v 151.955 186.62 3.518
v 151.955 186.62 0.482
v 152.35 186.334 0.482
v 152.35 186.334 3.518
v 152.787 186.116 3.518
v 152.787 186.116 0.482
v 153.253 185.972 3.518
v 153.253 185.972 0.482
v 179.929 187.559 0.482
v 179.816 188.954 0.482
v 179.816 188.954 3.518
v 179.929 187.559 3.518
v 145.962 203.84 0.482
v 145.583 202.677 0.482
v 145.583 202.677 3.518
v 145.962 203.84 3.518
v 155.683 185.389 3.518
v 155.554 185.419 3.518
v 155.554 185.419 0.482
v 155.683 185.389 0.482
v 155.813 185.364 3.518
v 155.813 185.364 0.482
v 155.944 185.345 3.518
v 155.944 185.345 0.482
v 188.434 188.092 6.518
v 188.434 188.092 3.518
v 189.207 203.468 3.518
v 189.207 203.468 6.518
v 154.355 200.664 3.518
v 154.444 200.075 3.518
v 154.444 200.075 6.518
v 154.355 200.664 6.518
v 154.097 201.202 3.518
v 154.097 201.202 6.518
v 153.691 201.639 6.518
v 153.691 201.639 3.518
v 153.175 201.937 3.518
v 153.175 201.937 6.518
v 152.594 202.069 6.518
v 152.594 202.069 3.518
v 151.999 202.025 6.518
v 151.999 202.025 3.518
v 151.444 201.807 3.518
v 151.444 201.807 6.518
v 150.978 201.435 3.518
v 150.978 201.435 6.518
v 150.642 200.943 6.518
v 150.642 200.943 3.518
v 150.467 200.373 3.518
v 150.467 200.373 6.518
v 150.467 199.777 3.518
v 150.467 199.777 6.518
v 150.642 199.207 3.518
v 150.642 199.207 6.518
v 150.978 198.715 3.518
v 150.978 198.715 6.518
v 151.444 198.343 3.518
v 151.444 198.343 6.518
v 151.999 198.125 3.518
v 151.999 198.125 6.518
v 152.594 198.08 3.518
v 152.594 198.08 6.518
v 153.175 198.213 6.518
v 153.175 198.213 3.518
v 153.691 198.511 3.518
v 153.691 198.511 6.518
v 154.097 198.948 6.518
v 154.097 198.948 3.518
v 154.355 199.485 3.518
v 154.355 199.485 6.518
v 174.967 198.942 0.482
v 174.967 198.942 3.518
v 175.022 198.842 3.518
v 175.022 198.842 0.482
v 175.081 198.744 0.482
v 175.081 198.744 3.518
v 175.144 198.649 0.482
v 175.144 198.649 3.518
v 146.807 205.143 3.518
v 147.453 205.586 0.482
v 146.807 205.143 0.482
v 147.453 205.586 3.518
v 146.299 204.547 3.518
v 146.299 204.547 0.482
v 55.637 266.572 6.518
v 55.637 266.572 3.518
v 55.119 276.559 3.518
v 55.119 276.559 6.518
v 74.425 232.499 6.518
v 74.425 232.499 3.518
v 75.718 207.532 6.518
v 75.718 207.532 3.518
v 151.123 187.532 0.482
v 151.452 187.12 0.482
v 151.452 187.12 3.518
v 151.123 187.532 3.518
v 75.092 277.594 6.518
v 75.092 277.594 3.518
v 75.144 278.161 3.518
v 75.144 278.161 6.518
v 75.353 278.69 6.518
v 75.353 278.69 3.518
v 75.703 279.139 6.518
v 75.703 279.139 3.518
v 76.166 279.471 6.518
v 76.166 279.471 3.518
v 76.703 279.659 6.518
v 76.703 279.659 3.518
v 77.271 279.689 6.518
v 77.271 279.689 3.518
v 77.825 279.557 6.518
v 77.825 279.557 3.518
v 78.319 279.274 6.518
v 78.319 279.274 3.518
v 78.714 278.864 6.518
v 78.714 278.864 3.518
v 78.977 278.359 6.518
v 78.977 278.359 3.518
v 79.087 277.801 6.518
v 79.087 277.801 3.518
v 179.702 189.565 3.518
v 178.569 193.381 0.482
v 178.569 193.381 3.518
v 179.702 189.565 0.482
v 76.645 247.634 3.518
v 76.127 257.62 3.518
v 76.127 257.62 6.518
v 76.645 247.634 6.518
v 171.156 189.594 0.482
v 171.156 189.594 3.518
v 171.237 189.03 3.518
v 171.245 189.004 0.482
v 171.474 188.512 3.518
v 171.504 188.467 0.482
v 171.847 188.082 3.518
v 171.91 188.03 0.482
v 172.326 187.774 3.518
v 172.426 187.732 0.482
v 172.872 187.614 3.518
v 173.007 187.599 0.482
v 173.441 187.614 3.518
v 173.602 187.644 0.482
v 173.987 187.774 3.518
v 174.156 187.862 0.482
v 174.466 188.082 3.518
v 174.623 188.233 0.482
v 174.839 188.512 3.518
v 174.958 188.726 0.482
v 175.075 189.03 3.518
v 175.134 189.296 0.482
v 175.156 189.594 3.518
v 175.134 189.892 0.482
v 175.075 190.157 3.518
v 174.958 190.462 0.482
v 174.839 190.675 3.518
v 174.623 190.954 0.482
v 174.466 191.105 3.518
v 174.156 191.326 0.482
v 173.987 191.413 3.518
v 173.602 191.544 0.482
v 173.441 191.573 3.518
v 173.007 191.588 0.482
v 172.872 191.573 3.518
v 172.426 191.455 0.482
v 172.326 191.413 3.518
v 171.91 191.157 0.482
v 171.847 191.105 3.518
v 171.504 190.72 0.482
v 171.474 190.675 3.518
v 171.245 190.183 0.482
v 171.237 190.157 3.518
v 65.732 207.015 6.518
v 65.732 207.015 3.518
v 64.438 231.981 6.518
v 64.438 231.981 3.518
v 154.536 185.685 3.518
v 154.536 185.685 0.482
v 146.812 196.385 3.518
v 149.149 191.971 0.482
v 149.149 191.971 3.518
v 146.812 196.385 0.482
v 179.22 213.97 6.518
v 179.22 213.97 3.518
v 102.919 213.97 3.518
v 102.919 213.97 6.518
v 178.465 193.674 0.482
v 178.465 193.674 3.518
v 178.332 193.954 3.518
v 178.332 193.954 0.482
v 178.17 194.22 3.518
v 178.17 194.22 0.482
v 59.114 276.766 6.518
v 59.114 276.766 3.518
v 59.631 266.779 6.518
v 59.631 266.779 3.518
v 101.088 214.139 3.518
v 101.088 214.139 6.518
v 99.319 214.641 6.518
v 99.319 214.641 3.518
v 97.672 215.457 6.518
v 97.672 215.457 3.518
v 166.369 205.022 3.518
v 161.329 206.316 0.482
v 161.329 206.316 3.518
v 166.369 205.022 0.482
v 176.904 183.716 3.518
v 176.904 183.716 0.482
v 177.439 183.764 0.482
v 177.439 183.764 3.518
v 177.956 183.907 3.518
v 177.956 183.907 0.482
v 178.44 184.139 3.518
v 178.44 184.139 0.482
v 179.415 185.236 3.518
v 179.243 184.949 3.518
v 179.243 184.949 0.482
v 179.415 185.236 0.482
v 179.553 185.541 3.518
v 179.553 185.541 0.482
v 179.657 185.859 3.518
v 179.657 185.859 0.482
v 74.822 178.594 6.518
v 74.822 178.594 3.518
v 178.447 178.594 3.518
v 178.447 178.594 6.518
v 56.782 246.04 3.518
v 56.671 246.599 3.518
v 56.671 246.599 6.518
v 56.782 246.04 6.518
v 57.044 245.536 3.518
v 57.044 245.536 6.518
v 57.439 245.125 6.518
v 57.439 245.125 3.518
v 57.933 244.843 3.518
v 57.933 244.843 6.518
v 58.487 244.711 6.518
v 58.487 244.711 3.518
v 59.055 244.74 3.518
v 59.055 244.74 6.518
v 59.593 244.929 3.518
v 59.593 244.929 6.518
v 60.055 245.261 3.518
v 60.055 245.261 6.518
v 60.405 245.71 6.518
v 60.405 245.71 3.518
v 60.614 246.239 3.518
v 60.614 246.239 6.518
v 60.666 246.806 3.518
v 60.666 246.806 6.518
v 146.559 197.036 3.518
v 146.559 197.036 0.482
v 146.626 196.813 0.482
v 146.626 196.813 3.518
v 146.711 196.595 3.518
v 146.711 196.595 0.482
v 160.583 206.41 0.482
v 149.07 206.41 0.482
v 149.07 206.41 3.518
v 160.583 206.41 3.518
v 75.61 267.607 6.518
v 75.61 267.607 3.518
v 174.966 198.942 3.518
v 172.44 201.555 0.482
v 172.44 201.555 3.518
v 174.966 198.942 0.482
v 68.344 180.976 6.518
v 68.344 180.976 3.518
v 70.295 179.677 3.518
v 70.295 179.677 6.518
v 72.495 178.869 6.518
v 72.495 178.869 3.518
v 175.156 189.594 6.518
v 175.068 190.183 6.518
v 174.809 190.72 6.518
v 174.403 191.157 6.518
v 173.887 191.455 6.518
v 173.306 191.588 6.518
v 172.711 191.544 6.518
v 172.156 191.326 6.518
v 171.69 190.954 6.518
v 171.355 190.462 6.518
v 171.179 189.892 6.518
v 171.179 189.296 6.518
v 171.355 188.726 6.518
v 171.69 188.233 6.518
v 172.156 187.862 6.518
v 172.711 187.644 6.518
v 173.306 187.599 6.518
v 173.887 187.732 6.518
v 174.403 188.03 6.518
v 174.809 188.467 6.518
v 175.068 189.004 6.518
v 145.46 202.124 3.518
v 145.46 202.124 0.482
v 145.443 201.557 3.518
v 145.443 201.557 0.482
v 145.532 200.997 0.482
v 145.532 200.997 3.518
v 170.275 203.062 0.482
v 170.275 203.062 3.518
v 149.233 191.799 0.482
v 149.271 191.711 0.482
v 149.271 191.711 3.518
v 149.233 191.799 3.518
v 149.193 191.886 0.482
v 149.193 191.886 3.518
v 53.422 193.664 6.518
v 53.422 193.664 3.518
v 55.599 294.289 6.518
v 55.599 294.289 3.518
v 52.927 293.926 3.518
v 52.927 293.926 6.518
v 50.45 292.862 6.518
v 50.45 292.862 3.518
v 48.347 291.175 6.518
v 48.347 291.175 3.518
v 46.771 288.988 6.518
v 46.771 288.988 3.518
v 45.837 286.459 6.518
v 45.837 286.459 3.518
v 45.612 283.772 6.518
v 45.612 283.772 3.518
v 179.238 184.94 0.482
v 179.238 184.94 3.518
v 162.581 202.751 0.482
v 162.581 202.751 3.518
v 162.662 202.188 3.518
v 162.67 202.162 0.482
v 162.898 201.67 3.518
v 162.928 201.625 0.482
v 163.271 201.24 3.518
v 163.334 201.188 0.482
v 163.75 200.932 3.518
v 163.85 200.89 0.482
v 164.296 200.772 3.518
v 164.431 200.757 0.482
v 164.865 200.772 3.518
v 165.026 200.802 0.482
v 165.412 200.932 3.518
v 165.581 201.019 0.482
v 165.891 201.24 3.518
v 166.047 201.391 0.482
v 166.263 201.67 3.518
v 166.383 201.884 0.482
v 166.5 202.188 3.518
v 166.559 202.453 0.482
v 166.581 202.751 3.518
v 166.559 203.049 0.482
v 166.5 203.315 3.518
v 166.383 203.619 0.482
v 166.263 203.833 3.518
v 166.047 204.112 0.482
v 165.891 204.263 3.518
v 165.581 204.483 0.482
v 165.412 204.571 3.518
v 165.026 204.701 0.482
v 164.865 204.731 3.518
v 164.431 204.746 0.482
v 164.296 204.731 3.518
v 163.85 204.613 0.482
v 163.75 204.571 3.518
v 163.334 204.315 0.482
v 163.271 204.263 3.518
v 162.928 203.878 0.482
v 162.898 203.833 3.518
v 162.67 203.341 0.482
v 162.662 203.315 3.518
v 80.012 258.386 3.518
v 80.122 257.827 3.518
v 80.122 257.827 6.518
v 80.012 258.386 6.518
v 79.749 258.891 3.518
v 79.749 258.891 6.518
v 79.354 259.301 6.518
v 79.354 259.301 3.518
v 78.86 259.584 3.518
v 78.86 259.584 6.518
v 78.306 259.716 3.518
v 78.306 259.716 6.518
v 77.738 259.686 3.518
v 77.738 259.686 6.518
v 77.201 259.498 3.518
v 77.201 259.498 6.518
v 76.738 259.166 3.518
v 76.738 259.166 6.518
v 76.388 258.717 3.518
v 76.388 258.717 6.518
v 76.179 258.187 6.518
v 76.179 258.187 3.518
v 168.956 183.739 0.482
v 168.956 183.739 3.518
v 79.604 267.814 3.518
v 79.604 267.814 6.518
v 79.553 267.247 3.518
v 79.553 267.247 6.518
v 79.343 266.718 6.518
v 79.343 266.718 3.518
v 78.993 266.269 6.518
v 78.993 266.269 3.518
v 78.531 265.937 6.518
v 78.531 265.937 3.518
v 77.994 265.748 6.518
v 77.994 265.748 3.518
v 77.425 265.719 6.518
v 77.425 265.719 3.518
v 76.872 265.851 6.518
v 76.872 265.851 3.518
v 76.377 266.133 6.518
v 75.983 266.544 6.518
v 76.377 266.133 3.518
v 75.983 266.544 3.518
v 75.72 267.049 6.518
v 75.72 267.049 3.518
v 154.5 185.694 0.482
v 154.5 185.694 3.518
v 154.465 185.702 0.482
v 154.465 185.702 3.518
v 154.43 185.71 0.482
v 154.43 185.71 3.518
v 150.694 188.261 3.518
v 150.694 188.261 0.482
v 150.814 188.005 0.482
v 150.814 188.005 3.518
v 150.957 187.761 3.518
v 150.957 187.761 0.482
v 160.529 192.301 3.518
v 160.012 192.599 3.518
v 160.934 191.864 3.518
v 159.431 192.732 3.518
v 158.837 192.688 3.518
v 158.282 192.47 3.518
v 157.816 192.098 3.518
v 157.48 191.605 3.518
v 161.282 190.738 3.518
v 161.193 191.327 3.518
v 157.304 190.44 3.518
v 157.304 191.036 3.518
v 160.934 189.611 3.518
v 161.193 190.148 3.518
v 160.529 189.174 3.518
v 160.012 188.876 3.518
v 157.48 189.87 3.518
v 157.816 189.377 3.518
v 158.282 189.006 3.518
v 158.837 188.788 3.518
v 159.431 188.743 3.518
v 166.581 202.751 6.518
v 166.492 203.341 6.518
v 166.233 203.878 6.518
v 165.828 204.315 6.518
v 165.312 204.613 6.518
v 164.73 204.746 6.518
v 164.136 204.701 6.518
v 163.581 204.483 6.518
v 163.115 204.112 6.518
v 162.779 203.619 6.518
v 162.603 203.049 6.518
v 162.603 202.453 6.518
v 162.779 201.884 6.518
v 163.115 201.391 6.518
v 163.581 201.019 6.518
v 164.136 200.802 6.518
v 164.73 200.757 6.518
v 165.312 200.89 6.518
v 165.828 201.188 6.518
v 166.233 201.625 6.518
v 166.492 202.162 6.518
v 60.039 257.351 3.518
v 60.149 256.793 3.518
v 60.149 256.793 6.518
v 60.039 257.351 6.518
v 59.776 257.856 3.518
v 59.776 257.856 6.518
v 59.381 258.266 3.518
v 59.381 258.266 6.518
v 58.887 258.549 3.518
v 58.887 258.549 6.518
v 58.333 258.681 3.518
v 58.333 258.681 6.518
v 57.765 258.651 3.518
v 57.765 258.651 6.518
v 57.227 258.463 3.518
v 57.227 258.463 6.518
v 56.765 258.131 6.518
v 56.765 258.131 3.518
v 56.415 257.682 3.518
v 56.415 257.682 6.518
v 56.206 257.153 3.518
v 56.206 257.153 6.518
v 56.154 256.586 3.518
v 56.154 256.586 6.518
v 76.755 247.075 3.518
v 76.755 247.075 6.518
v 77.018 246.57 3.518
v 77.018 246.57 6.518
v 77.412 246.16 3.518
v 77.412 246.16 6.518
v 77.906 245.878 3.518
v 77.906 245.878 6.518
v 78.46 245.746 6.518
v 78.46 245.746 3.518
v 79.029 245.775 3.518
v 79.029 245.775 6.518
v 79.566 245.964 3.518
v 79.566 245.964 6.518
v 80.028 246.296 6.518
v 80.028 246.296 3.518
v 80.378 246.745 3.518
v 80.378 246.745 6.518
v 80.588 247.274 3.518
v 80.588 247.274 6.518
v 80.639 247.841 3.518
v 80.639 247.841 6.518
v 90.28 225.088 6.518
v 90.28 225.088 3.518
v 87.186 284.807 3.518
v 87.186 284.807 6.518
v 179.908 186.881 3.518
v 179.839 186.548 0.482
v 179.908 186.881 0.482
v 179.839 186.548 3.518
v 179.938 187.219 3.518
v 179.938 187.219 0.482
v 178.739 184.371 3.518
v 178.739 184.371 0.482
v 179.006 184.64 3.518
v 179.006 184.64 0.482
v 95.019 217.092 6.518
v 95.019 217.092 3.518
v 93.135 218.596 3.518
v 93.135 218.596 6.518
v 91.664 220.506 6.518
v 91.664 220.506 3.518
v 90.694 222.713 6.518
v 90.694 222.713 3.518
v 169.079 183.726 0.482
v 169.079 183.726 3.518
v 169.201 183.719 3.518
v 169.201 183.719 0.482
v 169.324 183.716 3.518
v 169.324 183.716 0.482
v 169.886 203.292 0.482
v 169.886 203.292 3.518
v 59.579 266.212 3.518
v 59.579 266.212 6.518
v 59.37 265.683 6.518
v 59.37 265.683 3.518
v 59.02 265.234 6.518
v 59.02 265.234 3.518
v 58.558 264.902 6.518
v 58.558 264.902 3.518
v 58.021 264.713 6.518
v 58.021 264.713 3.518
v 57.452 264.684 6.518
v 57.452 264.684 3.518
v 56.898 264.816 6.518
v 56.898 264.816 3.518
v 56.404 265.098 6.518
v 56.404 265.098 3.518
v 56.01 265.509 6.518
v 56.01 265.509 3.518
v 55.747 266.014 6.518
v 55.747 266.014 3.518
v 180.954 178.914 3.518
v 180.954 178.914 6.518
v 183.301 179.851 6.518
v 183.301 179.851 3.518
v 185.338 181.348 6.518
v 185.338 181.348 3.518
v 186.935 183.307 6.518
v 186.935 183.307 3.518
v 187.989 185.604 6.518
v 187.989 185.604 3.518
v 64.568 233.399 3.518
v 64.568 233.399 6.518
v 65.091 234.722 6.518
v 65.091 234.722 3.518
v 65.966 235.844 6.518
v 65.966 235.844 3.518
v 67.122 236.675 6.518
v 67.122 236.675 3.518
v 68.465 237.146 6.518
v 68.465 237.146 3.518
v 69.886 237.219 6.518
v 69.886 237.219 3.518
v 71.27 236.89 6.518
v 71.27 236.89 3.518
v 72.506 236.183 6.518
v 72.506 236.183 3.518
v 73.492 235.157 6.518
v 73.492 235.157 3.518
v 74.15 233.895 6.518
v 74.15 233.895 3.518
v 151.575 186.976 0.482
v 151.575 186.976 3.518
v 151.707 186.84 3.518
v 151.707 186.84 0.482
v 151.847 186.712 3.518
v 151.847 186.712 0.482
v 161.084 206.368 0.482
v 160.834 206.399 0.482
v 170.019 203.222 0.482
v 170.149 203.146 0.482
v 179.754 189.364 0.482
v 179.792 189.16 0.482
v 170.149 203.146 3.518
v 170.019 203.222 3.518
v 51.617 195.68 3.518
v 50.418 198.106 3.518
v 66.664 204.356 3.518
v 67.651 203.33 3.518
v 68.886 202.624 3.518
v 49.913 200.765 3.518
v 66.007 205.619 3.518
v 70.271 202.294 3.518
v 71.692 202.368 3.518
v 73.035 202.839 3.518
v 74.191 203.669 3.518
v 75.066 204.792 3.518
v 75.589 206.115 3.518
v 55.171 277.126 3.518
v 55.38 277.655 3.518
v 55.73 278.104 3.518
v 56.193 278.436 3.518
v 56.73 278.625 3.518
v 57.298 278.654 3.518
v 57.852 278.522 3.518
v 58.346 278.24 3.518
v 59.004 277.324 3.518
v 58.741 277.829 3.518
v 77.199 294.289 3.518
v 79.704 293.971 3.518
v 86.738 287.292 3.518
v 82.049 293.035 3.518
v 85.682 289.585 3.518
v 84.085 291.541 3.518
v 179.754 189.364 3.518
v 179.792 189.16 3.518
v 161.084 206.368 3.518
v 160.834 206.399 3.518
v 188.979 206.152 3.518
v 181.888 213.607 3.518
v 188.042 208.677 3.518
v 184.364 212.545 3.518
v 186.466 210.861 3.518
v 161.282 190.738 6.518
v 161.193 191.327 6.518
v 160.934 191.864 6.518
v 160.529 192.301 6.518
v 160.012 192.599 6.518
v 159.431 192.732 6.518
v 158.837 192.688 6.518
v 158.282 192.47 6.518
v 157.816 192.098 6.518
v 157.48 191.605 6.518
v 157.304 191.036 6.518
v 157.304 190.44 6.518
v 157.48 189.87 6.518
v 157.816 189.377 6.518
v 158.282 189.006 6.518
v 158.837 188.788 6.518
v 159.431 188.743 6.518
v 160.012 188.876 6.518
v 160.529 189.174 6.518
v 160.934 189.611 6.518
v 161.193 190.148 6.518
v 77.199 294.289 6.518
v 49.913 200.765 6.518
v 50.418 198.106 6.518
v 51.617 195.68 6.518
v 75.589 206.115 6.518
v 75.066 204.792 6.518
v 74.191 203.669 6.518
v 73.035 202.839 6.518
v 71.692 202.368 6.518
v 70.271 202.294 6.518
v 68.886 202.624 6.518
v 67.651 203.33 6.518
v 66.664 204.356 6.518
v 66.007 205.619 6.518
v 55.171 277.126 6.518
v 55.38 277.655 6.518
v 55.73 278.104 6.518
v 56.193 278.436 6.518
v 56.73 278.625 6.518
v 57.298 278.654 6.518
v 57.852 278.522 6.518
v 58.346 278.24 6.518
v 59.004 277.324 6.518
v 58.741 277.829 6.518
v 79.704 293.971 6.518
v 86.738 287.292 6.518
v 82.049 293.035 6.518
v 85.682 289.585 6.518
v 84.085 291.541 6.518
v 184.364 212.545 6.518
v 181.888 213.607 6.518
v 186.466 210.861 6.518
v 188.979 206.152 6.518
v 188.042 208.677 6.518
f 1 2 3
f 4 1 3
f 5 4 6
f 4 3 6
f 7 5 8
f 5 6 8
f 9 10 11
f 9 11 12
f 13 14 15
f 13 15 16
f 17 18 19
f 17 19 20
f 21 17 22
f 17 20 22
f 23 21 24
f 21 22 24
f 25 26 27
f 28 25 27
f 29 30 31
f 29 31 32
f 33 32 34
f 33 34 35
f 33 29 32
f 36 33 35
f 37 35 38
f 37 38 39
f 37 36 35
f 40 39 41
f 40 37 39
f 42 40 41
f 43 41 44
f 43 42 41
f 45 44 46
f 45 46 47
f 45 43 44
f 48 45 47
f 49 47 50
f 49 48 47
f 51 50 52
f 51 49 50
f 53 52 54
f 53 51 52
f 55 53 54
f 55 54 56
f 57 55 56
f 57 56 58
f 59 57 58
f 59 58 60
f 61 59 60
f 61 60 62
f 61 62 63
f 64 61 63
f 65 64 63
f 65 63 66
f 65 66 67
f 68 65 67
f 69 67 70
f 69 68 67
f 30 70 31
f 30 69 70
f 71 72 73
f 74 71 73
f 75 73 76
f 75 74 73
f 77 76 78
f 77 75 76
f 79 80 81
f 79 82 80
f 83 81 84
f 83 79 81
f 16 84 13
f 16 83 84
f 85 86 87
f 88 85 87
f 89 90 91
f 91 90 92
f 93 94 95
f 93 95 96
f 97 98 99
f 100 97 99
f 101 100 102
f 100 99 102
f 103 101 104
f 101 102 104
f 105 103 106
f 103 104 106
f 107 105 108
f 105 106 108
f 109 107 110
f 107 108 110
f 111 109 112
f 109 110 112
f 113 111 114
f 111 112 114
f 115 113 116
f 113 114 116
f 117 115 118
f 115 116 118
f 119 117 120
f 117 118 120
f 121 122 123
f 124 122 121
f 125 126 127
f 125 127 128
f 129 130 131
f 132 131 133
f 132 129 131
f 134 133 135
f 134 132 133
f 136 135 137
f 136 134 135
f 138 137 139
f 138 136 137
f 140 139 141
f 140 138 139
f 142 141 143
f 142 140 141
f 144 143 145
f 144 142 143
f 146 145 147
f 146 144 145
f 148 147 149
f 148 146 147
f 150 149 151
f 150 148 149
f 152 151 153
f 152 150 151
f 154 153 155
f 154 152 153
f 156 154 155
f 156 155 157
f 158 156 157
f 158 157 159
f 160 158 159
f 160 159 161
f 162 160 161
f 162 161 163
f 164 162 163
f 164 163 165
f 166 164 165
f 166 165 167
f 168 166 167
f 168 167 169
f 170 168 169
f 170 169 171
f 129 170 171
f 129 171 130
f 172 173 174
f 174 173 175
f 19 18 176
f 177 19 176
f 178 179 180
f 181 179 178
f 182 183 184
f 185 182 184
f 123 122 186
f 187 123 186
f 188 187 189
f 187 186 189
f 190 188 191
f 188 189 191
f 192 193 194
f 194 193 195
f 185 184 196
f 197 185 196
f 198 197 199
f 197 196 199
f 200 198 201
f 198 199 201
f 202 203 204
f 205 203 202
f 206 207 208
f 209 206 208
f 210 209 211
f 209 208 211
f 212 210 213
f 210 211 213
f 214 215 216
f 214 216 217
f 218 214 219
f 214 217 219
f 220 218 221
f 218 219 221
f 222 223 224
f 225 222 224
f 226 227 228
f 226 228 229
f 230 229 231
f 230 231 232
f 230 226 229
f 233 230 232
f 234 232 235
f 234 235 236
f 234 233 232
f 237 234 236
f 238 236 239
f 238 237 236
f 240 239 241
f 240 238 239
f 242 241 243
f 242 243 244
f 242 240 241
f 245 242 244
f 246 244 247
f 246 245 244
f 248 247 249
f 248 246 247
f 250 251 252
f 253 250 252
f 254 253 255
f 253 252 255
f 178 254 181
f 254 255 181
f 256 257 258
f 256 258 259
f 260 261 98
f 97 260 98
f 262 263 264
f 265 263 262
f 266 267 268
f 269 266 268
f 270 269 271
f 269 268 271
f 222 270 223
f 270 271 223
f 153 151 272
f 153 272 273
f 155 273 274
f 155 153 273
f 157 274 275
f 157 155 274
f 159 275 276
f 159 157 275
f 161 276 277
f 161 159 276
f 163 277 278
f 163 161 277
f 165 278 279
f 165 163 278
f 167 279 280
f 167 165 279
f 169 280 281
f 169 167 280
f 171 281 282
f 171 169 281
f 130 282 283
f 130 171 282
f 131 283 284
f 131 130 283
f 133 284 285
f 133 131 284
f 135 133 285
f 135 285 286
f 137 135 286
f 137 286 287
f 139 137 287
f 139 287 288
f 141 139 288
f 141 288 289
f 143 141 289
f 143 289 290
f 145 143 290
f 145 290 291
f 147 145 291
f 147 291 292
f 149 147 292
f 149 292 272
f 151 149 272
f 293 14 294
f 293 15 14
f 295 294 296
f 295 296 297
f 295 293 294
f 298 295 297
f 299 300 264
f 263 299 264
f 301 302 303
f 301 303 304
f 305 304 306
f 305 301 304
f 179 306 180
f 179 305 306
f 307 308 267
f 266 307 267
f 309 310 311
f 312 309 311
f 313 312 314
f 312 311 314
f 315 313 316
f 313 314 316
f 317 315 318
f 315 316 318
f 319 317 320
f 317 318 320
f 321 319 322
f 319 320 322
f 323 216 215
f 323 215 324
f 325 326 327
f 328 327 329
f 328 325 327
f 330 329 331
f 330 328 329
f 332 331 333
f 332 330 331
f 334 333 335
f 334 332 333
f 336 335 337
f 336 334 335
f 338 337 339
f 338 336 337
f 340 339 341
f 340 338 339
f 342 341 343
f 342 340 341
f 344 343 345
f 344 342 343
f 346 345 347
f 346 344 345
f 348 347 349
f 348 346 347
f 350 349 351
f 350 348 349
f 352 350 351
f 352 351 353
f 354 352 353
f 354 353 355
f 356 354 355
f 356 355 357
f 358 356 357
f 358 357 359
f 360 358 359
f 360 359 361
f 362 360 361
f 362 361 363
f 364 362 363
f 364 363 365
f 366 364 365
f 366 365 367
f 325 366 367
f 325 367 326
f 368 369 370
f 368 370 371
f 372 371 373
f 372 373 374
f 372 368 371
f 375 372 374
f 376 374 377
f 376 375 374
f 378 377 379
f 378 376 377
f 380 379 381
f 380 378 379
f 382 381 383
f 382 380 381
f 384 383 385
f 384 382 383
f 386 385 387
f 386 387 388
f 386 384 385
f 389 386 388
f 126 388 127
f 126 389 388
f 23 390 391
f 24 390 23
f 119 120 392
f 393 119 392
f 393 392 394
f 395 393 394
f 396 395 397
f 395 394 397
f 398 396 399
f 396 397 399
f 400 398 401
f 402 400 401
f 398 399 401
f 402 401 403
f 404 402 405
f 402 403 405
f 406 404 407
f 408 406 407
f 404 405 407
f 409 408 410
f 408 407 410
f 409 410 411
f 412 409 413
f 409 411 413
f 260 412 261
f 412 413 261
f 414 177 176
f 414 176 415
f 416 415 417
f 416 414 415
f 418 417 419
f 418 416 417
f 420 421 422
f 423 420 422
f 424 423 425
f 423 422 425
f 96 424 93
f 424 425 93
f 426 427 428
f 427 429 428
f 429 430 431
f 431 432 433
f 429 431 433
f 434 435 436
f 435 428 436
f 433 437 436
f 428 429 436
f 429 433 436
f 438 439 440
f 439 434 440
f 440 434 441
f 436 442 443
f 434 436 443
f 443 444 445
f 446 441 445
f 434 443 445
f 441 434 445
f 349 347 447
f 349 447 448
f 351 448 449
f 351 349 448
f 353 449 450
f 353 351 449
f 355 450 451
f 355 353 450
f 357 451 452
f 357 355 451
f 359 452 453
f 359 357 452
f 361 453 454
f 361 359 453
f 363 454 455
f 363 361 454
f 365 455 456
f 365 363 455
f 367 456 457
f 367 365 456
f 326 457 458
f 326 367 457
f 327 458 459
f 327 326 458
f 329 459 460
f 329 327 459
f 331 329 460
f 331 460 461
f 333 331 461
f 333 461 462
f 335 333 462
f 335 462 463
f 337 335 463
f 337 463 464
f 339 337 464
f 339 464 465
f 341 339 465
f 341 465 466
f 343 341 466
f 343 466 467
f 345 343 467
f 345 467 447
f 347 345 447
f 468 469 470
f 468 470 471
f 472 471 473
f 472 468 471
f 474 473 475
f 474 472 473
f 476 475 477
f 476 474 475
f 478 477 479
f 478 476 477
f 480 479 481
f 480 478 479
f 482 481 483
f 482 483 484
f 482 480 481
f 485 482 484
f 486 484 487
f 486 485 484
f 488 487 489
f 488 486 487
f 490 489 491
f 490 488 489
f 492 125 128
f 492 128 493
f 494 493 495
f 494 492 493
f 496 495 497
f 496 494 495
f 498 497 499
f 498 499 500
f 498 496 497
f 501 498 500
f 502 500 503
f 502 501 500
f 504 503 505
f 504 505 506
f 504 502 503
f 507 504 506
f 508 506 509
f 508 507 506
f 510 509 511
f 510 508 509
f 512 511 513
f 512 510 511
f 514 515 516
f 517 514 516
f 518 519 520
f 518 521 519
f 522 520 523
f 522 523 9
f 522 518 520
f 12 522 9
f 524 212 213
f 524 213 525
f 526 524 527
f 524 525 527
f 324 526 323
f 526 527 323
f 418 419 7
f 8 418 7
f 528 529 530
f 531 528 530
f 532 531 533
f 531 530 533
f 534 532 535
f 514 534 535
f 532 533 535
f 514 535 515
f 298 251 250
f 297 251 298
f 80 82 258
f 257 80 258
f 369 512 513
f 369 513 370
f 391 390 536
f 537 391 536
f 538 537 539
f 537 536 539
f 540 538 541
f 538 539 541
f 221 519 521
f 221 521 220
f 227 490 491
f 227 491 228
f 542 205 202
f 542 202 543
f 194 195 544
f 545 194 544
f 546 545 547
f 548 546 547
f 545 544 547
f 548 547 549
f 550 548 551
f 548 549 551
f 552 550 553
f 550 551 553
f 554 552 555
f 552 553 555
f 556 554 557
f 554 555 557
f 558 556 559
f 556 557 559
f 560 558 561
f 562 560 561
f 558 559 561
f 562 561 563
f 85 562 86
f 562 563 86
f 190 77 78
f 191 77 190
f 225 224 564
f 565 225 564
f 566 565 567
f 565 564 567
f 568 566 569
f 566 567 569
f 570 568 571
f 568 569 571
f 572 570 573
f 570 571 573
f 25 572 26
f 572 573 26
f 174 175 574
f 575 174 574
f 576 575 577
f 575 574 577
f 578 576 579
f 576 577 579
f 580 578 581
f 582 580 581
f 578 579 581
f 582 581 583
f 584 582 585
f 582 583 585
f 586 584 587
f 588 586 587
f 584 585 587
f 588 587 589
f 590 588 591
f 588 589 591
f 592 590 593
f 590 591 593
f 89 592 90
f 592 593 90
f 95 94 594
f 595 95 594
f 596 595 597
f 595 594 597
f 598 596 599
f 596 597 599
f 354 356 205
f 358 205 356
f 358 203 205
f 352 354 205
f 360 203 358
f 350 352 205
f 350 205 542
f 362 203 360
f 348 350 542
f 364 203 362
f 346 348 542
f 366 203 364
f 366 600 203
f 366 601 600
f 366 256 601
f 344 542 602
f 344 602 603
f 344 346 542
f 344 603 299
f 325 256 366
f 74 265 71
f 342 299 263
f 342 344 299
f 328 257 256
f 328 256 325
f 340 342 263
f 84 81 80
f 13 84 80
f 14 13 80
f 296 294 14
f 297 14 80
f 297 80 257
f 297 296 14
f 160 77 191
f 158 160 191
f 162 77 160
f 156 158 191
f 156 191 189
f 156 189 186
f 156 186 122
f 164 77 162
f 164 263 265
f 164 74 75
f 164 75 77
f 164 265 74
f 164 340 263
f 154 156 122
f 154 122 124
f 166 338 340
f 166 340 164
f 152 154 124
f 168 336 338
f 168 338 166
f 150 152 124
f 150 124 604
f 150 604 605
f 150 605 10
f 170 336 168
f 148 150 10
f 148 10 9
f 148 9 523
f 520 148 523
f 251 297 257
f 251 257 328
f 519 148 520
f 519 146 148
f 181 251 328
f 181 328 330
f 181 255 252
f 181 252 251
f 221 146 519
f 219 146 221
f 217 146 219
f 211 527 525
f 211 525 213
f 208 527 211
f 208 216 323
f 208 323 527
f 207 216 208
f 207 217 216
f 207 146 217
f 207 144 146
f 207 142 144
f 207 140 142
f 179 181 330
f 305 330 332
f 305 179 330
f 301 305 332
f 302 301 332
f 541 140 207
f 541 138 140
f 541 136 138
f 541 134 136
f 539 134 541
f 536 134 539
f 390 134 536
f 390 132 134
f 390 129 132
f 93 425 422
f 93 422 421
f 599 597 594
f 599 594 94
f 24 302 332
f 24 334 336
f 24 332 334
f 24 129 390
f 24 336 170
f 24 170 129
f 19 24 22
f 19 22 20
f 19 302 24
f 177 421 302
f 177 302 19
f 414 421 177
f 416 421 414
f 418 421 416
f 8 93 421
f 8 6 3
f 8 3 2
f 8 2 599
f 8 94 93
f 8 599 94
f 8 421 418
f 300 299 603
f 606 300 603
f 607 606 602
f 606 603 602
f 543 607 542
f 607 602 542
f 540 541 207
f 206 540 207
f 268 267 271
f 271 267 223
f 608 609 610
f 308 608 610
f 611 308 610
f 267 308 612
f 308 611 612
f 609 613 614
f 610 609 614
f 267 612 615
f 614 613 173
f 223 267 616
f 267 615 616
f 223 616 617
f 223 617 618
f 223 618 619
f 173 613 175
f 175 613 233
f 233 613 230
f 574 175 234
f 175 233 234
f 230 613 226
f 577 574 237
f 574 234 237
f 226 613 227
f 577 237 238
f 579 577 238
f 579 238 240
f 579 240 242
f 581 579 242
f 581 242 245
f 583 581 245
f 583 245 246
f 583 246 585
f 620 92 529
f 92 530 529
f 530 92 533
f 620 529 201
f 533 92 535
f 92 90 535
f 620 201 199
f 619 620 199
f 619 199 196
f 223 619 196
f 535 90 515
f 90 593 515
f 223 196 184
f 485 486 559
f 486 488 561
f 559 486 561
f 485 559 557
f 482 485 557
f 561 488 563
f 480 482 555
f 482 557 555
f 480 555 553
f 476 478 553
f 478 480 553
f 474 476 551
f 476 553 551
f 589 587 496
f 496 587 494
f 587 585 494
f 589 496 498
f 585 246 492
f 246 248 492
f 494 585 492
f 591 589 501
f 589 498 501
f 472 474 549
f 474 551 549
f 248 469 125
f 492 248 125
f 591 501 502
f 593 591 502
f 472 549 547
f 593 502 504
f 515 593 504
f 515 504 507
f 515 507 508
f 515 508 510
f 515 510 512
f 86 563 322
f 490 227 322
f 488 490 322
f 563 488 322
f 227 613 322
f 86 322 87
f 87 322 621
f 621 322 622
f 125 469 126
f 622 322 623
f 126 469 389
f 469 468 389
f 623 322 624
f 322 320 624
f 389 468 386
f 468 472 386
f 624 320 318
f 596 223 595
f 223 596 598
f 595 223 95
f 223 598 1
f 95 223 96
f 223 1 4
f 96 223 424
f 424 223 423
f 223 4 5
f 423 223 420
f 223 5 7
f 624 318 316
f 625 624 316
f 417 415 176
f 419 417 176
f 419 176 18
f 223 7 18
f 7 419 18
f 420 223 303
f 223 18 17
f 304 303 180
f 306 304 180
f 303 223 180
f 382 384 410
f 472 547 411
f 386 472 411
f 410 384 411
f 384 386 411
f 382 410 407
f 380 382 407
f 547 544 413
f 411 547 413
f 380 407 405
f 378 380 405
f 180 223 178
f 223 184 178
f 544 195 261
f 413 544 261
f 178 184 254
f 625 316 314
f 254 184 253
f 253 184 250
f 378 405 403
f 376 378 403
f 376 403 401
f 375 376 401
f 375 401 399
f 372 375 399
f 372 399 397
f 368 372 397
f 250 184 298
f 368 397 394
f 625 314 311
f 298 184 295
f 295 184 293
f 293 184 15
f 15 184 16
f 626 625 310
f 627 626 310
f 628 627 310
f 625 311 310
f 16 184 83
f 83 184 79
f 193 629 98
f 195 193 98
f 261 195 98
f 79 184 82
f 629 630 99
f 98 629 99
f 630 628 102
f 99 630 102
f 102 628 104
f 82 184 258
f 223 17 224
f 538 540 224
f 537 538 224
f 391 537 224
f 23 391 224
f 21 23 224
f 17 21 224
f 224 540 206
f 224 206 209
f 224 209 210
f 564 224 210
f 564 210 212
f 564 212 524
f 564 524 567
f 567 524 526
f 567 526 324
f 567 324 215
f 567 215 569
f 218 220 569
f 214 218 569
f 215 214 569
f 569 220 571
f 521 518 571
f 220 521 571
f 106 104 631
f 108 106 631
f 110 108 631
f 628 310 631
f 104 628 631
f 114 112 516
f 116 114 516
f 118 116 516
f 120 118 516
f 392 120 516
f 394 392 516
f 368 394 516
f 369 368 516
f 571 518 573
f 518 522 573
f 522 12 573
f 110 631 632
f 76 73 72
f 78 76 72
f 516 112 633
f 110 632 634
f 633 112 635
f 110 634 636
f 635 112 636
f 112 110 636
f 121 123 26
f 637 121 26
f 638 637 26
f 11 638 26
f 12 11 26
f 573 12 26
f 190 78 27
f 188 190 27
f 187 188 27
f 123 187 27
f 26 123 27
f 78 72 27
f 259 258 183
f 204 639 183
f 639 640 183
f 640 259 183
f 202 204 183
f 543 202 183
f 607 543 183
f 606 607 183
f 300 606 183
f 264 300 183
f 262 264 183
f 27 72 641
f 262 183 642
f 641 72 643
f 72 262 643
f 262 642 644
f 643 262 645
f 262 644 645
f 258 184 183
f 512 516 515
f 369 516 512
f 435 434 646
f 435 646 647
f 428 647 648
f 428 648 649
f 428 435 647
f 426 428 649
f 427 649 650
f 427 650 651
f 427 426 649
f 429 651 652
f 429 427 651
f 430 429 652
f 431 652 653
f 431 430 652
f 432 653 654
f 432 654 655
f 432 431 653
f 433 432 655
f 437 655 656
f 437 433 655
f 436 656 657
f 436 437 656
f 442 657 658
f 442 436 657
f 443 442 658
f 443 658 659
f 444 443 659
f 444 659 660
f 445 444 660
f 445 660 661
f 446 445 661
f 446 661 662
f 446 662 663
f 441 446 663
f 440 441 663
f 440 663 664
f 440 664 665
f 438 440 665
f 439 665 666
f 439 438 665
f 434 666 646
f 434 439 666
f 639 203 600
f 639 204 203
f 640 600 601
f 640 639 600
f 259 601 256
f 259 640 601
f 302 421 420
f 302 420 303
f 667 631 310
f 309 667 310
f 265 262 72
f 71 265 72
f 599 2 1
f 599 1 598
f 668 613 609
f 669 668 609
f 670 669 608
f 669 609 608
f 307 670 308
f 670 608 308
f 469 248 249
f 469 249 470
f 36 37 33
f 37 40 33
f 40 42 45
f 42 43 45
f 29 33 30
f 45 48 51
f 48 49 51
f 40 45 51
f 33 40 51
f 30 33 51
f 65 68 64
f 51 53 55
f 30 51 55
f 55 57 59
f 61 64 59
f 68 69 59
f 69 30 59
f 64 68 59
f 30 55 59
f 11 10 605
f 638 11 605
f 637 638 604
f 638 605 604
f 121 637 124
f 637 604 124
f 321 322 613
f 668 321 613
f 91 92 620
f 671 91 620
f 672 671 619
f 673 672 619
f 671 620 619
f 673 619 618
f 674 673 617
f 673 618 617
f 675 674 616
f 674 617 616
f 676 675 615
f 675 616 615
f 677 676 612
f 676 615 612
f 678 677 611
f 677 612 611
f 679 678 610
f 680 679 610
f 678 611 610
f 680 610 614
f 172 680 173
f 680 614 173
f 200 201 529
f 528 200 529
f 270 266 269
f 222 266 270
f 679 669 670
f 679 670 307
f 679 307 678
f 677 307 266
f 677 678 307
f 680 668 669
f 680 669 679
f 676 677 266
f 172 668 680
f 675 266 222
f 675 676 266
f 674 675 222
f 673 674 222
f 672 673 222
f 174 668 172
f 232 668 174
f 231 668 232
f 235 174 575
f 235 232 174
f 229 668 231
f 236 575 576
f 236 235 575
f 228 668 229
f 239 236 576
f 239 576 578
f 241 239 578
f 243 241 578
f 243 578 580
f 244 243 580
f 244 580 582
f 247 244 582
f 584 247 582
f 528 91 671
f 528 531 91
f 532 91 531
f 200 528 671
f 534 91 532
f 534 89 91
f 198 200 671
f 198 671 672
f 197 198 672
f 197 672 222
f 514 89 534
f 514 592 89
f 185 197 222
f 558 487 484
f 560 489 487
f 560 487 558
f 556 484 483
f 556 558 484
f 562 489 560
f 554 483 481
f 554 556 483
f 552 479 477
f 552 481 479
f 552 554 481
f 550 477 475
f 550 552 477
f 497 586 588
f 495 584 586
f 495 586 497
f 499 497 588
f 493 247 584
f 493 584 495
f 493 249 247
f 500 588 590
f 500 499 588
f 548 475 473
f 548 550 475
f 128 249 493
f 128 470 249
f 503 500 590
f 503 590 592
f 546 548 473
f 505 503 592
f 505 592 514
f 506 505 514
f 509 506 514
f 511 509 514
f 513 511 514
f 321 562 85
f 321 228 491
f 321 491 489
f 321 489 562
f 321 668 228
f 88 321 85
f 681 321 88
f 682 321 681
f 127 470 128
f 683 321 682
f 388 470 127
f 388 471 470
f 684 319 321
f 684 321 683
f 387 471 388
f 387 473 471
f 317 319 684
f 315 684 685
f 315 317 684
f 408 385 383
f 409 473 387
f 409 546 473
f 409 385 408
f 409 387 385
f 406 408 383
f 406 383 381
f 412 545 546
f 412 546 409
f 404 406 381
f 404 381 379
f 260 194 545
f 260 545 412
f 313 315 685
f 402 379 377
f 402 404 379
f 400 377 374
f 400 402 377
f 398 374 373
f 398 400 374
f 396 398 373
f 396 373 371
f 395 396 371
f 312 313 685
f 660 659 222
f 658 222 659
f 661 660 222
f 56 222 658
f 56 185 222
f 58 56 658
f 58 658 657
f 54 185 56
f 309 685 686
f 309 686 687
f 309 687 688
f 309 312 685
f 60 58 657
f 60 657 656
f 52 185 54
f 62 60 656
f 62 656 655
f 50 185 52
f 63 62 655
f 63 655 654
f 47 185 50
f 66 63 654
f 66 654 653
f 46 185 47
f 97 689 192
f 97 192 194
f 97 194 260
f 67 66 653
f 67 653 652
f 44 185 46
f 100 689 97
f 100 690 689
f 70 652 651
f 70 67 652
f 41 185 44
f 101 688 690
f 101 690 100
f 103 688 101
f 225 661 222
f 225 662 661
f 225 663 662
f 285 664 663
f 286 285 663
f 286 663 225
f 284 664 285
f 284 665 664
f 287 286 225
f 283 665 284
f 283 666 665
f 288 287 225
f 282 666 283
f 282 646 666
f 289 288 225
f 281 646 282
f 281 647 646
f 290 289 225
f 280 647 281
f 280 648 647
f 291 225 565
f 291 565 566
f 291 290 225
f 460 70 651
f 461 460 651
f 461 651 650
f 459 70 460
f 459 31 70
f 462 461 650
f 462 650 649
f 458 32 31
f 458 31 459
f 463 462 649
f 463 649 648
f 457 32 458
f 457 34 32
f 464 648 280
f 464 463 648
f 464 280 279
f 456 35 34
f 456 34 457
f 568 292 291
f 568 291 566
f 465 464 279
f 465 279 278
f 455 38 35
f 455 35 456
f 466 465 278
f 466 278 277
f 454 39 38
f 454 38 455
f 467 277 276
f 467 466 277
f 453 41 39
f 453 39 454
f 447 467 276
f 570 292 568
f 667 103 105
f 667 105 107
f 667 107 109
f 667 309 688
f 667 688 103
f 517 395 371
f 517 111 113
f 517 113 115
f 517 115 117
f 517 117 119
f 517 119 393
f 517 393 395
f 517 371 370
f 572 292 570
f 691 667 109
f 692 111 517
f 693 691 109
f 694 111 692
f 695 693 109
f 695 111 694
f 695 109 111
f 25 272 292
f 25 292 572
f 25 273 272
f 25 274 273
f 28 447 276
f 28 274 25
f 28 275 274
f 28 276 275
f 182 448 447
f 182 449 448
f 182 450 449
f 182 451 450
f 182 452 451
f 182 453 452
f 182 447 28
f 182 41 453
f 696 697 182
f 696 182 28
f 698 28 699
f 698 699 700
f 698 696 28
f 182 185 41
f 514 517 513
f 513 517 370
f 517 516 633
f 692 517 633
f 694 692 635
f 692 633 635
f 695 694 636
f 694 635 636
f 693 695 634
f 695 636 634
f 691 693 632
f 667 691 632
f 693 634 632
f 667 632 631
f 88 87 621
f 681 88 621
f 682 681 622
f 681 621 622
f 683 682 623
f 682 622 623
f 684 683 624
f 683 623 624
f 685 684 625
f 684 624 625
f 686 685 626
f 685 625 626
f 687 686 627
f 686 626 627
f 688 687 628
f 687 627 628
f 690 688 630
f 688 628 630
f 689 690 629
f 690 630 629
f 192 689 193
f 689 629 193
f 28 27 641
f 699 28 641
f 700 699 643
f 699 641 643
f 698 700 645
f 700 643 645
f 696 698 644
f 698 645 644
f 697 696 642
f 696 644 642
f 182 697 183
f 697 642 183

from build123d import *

# Parameters (mm, degrees)
BOSS_EXTRUDE1_DEPTH = 4
SCALE4_SCALE        = 0.75919
FILLET6_R           = 3
FILLET7_R           = 3
SKETCH2_R           = 2
BOSS_EXTRUDE2_DEPTH = 3
CUT_EXTRUDE1_START  = -10
SKETCH3_R           = 2
CUT_EXTRUDE1_DEPTH  = 10


with BuildPart() as part:
    # Sketch1 → Boss-Extrude1 (new body)
    with BuildSketch(Plane.XY):
        Polygon((139.887521377, 204.056894723), (141.24778548, 208.242322731), (144.835713473, 210.070135105), (160.500754315, 210.070135105), (167.622266071, 208.242322731), (172.522669487, 205.831679823), (175.619724447, 203.675502319), (178.946764591, 200.233807794), (179.037084843, 200.056512483), (183.5160481, 193.501931379), (185.301557704, 187.487393826), (185.539112291, 184.563645059), (184.954362538, 182.355057305), (184.113784767, 181.109966828), (182.651910383, 180.178021908), (181.232301611, 180.178021908), (171.271612606, 180.178021908), (153.63070922, 182.355057305), (151.966131288, 182.789295026), (149.384829279, 183.363134026), (148.208709289, 184.36807152), (147.189516356, 185.643755739), (145.029311699, 190.88387399), (141.644867129, 197.274737006), align=None)
    extrude(amount=BOSS_EXTRUDE1_DEPTH)


with BuildPart() as part_1:
    # Scale4: scaled about (162.417336375, 194.870616826, 2)
    add(part.part.scale(SCALE4_SCALE).moved(Location((39.111718772, 46.926793238, 0.48162))))

    # Fillet6
    # the kernel refuses this fillet: 3 mm, written as the material it adds along each edge
    with BuildSketch(Plane(origin=(175.034883215, 198.80769695, 0.48162), x_dir=(0.5641904622979087, -0.8256446706980383, 0), z_dir=(0, 0, 1))) as fillet6_piece_1_section:
        with BuildLine():
            CenterArc((FILLET6_R * 0.0642311981219, FILLET6_R), FILLET6_R, 262.649743959, 7.350256041)
            Line((-FILLET6_R * 0.063703385216, FILLET6_R * 0.00821739156901), (0, 0))
            Line((0, 0), (FILLET6_R * 0.0642311981219, 0))
        make_face()
    fillet6_piece_1 = extrude(amount=3.03676, mode=Mode.PRIVATE)
    fillet6_piece_1 = split(fillet6_piece_1, bisect_by=Plane(origin=(175.064317261, 198.840916135, 2), z_dir=(-0.7189811970622167, -0.6950295233088893, 0)), keep=Keep.TOP, mode=Mode.PRIVATE)
    add(fillet6_piece_1)
    with BuildSketch(Plane(origin=(154.482885985, 185.698598128, 0.48162), x_dir=(-0.9761697325769959, 0.21700841734954968, 0), z_dir=(0, 0, 1))) as fillet6_piece_2:
        with BuildLine():
            CenterArc((FILLET6_R * 0.0182188067452, FILLET6_R), FILLET6_R, 267.912509474, 2.087490526)
            Line((-FILLET6_R * 0.0182067162065, FILLET6_R * 0.000663629563253), (0, 0))
            Line((0, 0), (FILLET6_R * 0.0182188067452, 0))
        make_face()
    extrude(amount=3.03676)
    with BuildSketch(Plane(origin=(149.216521921, 191.843921532, 0.48162), x_dir=(-0.4680007470830183, 0.8837280694476876, 0), z_dir=(0, 0, 1))) as fillet6_piece_3:
        with BuildLine():
            CenterArc((FILLET6_R * 0.0480422965927, FILLET6_R), FILLET6_R, 264.498987959, 5.501012041)
            Line((-FILLET6_R * 0.0478210380477, FILLET6_R * 0.00460549475516), (0, 0))
            Line((0, 0), (FILLET6_R * 0.0480422965927, 0))
        make_face()
    extrude(amount=3.03676)
    # the kernel refuses this fillet: 3 mm, written as the material it takes off along each edge
    with BuildSketch(Plane(origin=(170.089204221, 203.192146242, -0.085723646), x_dir=(0.8206934047378623, -0.5713688260832711, 0), z_dir=(0, 0, 1))) as fillet6_2_piece_1:
        with BuildLine():
            CenterArc((FILLET6_R * 0.0756458194575, -FILLET6_R), FILLET6_R, 90, 8.651894609)
            Line((-FILLET6_R * 0.0747850106227, -FILLET6_R * 0.0113794634131), (0, 0))
            Line((0, 0), (FILLET6_R * 0.0756458194575, 0))
        make_face()
    extrude(amount=4.171447292, mode=Mode.SUBTRACT)
    with BuildSketch(Plane(origin=(179.790808366, 189.265347757, -0.299334996), x_dir=(0.08098313210757263, -0.9967154720952452, 0), z_dir=(0, 0, 1))) as fillet6_2_piece_2:
        with BuildLine():
            CenterArc((FILLET6_R * 0.104127332747, -FILLET6_R), FILLET6_R, 90, 11.889267137)
            Line((-FILLET6_R * 0.101893551021, -FILLET6_R * 0.0214524051169), (0, 0))
            Line((0, 0), (FILLET6_R * 0.104127332747, 0))
        make_face()
    extrude(amount=4.598669991, mode=Mode.SUBTRACT)
    with BuildSketch(Plane(origin=(179.527221267, 185.368929193, -0.786529904), x_dir=(-0.5595376521790817, -0.8288049322934323, 0), z_dir=(0, 0, 1))) as fillet6_2_piece_3:
        with BuildLine():
            CenterArc((FILLET6_R * 0.169086653883, -FILLET6_R), FILLET6_R, 90, 19.194353316)
            Line((-FILLET6_R * 0.159686919919, -FILLET6_R * 0.0555912234793), (0, 0))
            Line((0, 0), (FILLET6_R * 0.169086653883, 0))
        make_face()
    extrude(amount=5.573059808, mode=Mode.SUBTRACT)
    with BuildSketch(Plane(origin=(178.435267329, 193.831524522, -0.693636489), x_dir=(0.2845900515763164, -0.9586493115544337, 0), z_dir=(0, 0, 1))) as fillet6_2_piece_4:
        with BuildLine():
            CenterArc((FILLET6_R * 0.156700865162, -FILLET6_R), FILLET6_R, 90, 17.811748872)
            Line((-FILLET6_R * 0.149189673688, -FILLET6_R * 0.0479333120825), (0, 0))
            Line((0, 0), (FILLET6_R * 0.156700865162, 0))
        make_face()
    extrude(amount=5.387272977, mode=Mode.SUBTRACT)
    with BuildSketch(Plane(origin=(178.88906303, 184.423668954, -1.075559702), x_dir=(-0.8432271980573246, -0.5375573387615439, 0), z_dir=(0, 0, 1))) as fillet6_2_piece_5:
        with BuildLine():
            CenterArc((FILLET6_R * 0.207623960269, -FILLET6_R), FILLET6_R, 90, 23.458660046)
            Line((-FILLET6_R * 0.190463329283, -FILLET6_R * 0.0826524595894), (0, 0))
            Line((0, 0), (FILLET6_R * 0.207623960269, 0))
        make_face()
    extrude(amount=6.151119404, mode=Mode.SUBTRACT)
    with BuildSketch(Plane(origin=(169.139414347, 183.71614569, 0.020587263), x_dir=(-0.9924710740045749, 0.12247925238261967, 0), z_dir=(0, 0, 1))) as fillet6_2_piece_6:
        with BuildLine():
            CenterArc((FILLET6_R * 0.0614710316153, -FILLET6_R), FILLET6_R, 90, 7.035208973)
            Line((-FILLET6_R * 0.0610082207674, -FILLET6_R * 0.00752892599542), (0, 0))
            Line((0, 0), (FILLET6_R * 0.0614710316153, 0))
        make_face()
    extrude(amount=3.958825474, mode=Mode.SUBTRACT)
    with BuildSketch(Plane(origin=(155.746616905, 185.368929193, -0.015587097), x_dir=(-0.9676172723968424, 0.2524218971470086, 0), z_dir=(0, 0, 1))) as fillet6_2_piece_7:
        with BuildLine():
            CenterArc((FILLET6_R * 0.0662942795425, -FILLET6_R), FILLET6_R, 90, 7.585665015)
            Line((-FILLET6_R * 0.0657141117056, -FILLET6_R * 0.00875140119136), (0, 0))
            Line((0, 0), (FILLET6_R * 0.0662942795425, 0))
        make_face()
    extrude(amount=4.031174193, mode=Mode.SUBTRACT)
    with BuildSketch(Plane(origin=(150.856527695, 187.865676157, -0.587064111), x_dir=(-0.3811282524443585, 0.9245221766884282, 0), z_dir=(0, 0, 1))) as fillet6_2_piece_8:
        with BuildLine():
            CenterArc((FILLET6_R * 0.14249121477, -FILLET6_R), FILLET6_R, 90, 16.21910898)
            Line((-FILLET6_R * 0.136820147731, -FILLET6_R * 0.0397994153417), (0, 0))
            Line((0, 0), (FILLET6_R * 0.14249121477, 0))
        make_face()
    extrude(amount=5.174128222, mode=Mode.SUBTRACT)
    with BuildSketch(Plane(origin=(151.630288778, 186.897189455, -0.231632642), x_dir=(-0.6241891196597051, 0.7812732831080572, 0), z_dir=(0, 0, 1))) as fillet6_2_piece_9:
        with BuildLine():
            CenterArc((FILLET6_R * 0.0951003522105, -FILLET6_R), FILLET6_R, 90, 10.865021551)
            Line((-FILLET6_R * 0.0933955804828, -FILLET6_R * 0.0179260295894), (0, 0))
            Line((0, 0), (FILLET6_R * 0.0951003522104, 0))
        make_face()
    extrude(amount=4.463265283, mode=Mode.SUBTRACT)
    with BuildSketch(Plane(origin=(152.523187313, 186.134250959, -1.386873198), x_dir=(-0.7602667232190712, 0.6496110448304708, 0), z_dir=(0, 0, 1))) as fillet6_2_piece_10:
        with BuildLine():
            CenterArc((FILLET6_R * 0.249132426376, -FILLET6_R), FILLET6_R, 90, 27.978899274)
            Line((-FILLET6_R * 0.220013935166, -FILLET6_R * 0.116879571377), (0, 0))
            Line((0, 0), (FILLET6_R * 0.249132426376, 0))
        make_face()
    extrude(amount=6.773746396, mode=Mode.SUBTRACT)
    with BuildSketch(Plane(origin=(177.779222616, 183.71614569, -1.705674136), x_dir=(-1, 0, 0), z_dir=(0, 0, 1))) as fillet6_2_piece_11:
        with BuildLine():
            CenterArc((FILLET6_R * 0.291639218067, -FILLET6_R), FILLET6_R, 90, 32.517510615)
            Line((-FILLET6_R * 0.245918120694, -FILLET6_R * 0.156772801943), (0, 0))
            Line((0, 0), (FILLET6_R * 0.291639218067, 0))
        make_face()
    extrude(amount=7.411348271, mode=Mode.SUBTRACT)
    with BuildSketch(Plane(origin=(146.647085448, 196.695800825, -0.397967253), x_dir=(0.4680007470830723, -0.8837280694476589, 0), z_dir=(0, 0, 1))) as fillet6_2_piece_12:
        with BuildLine():
            CenterArc((FILLET6_R * 0.117278300393, FILLET6_R), FILLET6_R, 256.622007888, 13.377992112)
            Line((-FILLET6_R * 0.114095932972, FILLET6_R * 0.027135176844), (0, 0))
            Line((0, 0), (FILLET6_R * 0.117278300394, 0))
        make_face()
    extrude(amount=4.795934506, mode=Mode.SUBTRACT)

    # Fillet7
    fillet7_edges = [part_1.edges().sort_by_distance(p)[0] for p in [
        (145.312926127, 201.844747143, 2),
        (146.345625031, 205.022282232, 2),
        (160.962286441, 206.409939108, 2),
        (179.971157433, 187.04566693, 2),
    ]]
    fillet(fillet7_edges, radius=FILLET7_R)

    # Sketch2 → Boss-Extrude2 (add)
    with BuildSketch(Plane.XY.offset(3.51838)):
        with BuildLine():
            Line((188.434105361, 188.092238721), (189.20692612, 203.468129761))
            ThreePointArc((189.20692612, 203.468129761), (186.465906686, 210.861418968), (179.219533507, 213.97011461))
            Line((179.219533507, 213.97011461), (102.919230161, 213.97011461))
            ThreePointArc((102.919230161, 213.97011461), (100.192318492, 214.349098408), (97.672097891, 215.45732406))
            Line((97.672097891, 215.45732406), (95.019397498, 217.092401272))
            ThreePointArc((95.019397498, 217.092401272), (91.664314845, 220.505986156), (90.27992577, 225.087755274))
            Line((90.27992577, 225.087755274), (87.185701358, 284.806756585))
            ThreePointArc((87.185701358, 284.806756585), (84.084793931, 291.541022095), (77.19909736, 294.289320037))
            Line((77.19909736, 294.289320037), (55.59890347, 294.289320037))
            ThreePointArc((55.59890347, 294.289320037), (48.347201412, 291.175016608), (45.612299472, 283.77188349))
            Line((45.612299472, 283.77188349), (49.913159154, 200.7646381))
            ThreePointArc((49.913159154, 200.7646381), (50.934623775, 196.851919353), (53.422135939, 193.663653179))
            Line((53.422135939, 193.663653179), (68.344482326, 180.975802101))
            ThreePointArc((68.344482326, 180.975802101), (71.371328084, 179.208483997), (74.822109539, 178.59422357))
            Line((74.822109539, 178.59422357), (178.446712748, 178.59422357))
            ThreePointArc((178.446712748, 178.59422357), (185.338017106, 181.347850392), (188.434105361, 188.092238721))
        make_face()
        with Locations((173.156485543, 189.59374103)):
            Circle(SKETCH2_R, mode=Mode.SUBTRACT)
        with Locations((164.580858822, 202.751414961)):
            Circle(SKETCH2_R, mode=Mode.SUBTRACT)
        with Locations((159.281654358, 190.737720877)):
            Circle(SKETCH2_R, mode=Mode.SUBTRACT)
        with Locations((152.444215345, 200.074868776)):
            Circle(SKETCH2_R, mode=Mode.SUBTRACT)
        with BuildLine():
            Line((59.113788522, 276.765794371), (59.63122507, 266.779190373))
            ThreePointArc((59.63122507, 266.779190373), (57.73739158, 264.678382264), (55.636583471, 266.572215754))
            Line((55.636583471, 266.572215754), (55.119146923, 276.558819752))
            ThreePointArc((55.119146923, 276.558819752), (57.012980413, 278.659627861), (59.113788522, 276.765794371))
        make_face(mode=Mode.SUBTRACT)
        with BuildLine():
            Line((79.086996519, 277.800667467), (79.604433066, 267.814063469))
            ThreePointArc((79.604433066, 267.814063469), (77.710599576, 265.713255359), (75.609791467, 267.607088849))
            Line((75.609791467, 267.607088849), (75.092354919, 277.593692848))
            ThreePointArc((75.092354919, 277.593692848), (76.986188409, 279.694500957), (79.086996519, 277.800667467))
        make_face(mode=Mode.SUBTRACT)
        with BuildLine():
            Line((60.666098165, 246.805982376), (60.148661618, 256.792586375))
            ThreePointArc((60.148661618, 256.792586375), (58.047853508, 258.686419865), (56.154020018, 256.585611756))
            Line((56.154020018, 256.585611756), (56.671456566, 246.599007757))
            ThreePointArc((56.671456566, 246.599007757), (58.772264675, 244.705174267), (60.666098165, 246.805982376))
        make_face(mode=Mode.SUBTRACT)
        with BuildLine():
            Line((80.639306162, 247.840855472), (80.121869614, 257.82745947))
            ThreePointArc((80.121869614, 257.82745947), (78.021061505, 259.72129296), (76.127228015, 257.620484851))
            Line((76.127228015, 257.620484851), (76.644664563, 247.633880853))
            ThreePointArc((76.644664563, 247.633880853), (78.745472672, 245.740047363), (80.639306162, 247.840855472))
        make_face(mode=Mode.SUBTRACT)
        with BuildLine():
            Line((74.424838185, 232.498743891), (75.718429554, 207.532233895))
            ThreePointArc((75.718429554, 207.532233895), (70.983845829, 202.280213622), (65.731825556, 207.014797347))
            Line((65.731825556, 207.014797347), (64.438234187, 231.981307343))
            ThreePointArc((64.438234187, 231.981307343), (69.172817912, 237.233327616), (74.424838185, 232.498743891))
        make_face(mode=Mode.SUBTRACT)
    extrude(amount=BOSS_EXTRUDE2_DEPTH)

    # Sketch3 → Cut-Extrude1 (cut)
    with BuildSketch(Plane.XY.offset(3.51838).offset(CUT_EXTRUDE1_START)):
        with Locations(Location((164.580858822, 202.751414961, 0), (0, 0, 180))):
            Circle(SKETCH3_R)
        with Locations(Location((173.156485543, 189.59374103, 0), (0, 0, 180))):
            Circle(SKETCH3_R)
    extrude(amount=CUT_EXTRUDE1_DEPTH, mode=Mode.SUBTRACT)


solid = part_1.part
